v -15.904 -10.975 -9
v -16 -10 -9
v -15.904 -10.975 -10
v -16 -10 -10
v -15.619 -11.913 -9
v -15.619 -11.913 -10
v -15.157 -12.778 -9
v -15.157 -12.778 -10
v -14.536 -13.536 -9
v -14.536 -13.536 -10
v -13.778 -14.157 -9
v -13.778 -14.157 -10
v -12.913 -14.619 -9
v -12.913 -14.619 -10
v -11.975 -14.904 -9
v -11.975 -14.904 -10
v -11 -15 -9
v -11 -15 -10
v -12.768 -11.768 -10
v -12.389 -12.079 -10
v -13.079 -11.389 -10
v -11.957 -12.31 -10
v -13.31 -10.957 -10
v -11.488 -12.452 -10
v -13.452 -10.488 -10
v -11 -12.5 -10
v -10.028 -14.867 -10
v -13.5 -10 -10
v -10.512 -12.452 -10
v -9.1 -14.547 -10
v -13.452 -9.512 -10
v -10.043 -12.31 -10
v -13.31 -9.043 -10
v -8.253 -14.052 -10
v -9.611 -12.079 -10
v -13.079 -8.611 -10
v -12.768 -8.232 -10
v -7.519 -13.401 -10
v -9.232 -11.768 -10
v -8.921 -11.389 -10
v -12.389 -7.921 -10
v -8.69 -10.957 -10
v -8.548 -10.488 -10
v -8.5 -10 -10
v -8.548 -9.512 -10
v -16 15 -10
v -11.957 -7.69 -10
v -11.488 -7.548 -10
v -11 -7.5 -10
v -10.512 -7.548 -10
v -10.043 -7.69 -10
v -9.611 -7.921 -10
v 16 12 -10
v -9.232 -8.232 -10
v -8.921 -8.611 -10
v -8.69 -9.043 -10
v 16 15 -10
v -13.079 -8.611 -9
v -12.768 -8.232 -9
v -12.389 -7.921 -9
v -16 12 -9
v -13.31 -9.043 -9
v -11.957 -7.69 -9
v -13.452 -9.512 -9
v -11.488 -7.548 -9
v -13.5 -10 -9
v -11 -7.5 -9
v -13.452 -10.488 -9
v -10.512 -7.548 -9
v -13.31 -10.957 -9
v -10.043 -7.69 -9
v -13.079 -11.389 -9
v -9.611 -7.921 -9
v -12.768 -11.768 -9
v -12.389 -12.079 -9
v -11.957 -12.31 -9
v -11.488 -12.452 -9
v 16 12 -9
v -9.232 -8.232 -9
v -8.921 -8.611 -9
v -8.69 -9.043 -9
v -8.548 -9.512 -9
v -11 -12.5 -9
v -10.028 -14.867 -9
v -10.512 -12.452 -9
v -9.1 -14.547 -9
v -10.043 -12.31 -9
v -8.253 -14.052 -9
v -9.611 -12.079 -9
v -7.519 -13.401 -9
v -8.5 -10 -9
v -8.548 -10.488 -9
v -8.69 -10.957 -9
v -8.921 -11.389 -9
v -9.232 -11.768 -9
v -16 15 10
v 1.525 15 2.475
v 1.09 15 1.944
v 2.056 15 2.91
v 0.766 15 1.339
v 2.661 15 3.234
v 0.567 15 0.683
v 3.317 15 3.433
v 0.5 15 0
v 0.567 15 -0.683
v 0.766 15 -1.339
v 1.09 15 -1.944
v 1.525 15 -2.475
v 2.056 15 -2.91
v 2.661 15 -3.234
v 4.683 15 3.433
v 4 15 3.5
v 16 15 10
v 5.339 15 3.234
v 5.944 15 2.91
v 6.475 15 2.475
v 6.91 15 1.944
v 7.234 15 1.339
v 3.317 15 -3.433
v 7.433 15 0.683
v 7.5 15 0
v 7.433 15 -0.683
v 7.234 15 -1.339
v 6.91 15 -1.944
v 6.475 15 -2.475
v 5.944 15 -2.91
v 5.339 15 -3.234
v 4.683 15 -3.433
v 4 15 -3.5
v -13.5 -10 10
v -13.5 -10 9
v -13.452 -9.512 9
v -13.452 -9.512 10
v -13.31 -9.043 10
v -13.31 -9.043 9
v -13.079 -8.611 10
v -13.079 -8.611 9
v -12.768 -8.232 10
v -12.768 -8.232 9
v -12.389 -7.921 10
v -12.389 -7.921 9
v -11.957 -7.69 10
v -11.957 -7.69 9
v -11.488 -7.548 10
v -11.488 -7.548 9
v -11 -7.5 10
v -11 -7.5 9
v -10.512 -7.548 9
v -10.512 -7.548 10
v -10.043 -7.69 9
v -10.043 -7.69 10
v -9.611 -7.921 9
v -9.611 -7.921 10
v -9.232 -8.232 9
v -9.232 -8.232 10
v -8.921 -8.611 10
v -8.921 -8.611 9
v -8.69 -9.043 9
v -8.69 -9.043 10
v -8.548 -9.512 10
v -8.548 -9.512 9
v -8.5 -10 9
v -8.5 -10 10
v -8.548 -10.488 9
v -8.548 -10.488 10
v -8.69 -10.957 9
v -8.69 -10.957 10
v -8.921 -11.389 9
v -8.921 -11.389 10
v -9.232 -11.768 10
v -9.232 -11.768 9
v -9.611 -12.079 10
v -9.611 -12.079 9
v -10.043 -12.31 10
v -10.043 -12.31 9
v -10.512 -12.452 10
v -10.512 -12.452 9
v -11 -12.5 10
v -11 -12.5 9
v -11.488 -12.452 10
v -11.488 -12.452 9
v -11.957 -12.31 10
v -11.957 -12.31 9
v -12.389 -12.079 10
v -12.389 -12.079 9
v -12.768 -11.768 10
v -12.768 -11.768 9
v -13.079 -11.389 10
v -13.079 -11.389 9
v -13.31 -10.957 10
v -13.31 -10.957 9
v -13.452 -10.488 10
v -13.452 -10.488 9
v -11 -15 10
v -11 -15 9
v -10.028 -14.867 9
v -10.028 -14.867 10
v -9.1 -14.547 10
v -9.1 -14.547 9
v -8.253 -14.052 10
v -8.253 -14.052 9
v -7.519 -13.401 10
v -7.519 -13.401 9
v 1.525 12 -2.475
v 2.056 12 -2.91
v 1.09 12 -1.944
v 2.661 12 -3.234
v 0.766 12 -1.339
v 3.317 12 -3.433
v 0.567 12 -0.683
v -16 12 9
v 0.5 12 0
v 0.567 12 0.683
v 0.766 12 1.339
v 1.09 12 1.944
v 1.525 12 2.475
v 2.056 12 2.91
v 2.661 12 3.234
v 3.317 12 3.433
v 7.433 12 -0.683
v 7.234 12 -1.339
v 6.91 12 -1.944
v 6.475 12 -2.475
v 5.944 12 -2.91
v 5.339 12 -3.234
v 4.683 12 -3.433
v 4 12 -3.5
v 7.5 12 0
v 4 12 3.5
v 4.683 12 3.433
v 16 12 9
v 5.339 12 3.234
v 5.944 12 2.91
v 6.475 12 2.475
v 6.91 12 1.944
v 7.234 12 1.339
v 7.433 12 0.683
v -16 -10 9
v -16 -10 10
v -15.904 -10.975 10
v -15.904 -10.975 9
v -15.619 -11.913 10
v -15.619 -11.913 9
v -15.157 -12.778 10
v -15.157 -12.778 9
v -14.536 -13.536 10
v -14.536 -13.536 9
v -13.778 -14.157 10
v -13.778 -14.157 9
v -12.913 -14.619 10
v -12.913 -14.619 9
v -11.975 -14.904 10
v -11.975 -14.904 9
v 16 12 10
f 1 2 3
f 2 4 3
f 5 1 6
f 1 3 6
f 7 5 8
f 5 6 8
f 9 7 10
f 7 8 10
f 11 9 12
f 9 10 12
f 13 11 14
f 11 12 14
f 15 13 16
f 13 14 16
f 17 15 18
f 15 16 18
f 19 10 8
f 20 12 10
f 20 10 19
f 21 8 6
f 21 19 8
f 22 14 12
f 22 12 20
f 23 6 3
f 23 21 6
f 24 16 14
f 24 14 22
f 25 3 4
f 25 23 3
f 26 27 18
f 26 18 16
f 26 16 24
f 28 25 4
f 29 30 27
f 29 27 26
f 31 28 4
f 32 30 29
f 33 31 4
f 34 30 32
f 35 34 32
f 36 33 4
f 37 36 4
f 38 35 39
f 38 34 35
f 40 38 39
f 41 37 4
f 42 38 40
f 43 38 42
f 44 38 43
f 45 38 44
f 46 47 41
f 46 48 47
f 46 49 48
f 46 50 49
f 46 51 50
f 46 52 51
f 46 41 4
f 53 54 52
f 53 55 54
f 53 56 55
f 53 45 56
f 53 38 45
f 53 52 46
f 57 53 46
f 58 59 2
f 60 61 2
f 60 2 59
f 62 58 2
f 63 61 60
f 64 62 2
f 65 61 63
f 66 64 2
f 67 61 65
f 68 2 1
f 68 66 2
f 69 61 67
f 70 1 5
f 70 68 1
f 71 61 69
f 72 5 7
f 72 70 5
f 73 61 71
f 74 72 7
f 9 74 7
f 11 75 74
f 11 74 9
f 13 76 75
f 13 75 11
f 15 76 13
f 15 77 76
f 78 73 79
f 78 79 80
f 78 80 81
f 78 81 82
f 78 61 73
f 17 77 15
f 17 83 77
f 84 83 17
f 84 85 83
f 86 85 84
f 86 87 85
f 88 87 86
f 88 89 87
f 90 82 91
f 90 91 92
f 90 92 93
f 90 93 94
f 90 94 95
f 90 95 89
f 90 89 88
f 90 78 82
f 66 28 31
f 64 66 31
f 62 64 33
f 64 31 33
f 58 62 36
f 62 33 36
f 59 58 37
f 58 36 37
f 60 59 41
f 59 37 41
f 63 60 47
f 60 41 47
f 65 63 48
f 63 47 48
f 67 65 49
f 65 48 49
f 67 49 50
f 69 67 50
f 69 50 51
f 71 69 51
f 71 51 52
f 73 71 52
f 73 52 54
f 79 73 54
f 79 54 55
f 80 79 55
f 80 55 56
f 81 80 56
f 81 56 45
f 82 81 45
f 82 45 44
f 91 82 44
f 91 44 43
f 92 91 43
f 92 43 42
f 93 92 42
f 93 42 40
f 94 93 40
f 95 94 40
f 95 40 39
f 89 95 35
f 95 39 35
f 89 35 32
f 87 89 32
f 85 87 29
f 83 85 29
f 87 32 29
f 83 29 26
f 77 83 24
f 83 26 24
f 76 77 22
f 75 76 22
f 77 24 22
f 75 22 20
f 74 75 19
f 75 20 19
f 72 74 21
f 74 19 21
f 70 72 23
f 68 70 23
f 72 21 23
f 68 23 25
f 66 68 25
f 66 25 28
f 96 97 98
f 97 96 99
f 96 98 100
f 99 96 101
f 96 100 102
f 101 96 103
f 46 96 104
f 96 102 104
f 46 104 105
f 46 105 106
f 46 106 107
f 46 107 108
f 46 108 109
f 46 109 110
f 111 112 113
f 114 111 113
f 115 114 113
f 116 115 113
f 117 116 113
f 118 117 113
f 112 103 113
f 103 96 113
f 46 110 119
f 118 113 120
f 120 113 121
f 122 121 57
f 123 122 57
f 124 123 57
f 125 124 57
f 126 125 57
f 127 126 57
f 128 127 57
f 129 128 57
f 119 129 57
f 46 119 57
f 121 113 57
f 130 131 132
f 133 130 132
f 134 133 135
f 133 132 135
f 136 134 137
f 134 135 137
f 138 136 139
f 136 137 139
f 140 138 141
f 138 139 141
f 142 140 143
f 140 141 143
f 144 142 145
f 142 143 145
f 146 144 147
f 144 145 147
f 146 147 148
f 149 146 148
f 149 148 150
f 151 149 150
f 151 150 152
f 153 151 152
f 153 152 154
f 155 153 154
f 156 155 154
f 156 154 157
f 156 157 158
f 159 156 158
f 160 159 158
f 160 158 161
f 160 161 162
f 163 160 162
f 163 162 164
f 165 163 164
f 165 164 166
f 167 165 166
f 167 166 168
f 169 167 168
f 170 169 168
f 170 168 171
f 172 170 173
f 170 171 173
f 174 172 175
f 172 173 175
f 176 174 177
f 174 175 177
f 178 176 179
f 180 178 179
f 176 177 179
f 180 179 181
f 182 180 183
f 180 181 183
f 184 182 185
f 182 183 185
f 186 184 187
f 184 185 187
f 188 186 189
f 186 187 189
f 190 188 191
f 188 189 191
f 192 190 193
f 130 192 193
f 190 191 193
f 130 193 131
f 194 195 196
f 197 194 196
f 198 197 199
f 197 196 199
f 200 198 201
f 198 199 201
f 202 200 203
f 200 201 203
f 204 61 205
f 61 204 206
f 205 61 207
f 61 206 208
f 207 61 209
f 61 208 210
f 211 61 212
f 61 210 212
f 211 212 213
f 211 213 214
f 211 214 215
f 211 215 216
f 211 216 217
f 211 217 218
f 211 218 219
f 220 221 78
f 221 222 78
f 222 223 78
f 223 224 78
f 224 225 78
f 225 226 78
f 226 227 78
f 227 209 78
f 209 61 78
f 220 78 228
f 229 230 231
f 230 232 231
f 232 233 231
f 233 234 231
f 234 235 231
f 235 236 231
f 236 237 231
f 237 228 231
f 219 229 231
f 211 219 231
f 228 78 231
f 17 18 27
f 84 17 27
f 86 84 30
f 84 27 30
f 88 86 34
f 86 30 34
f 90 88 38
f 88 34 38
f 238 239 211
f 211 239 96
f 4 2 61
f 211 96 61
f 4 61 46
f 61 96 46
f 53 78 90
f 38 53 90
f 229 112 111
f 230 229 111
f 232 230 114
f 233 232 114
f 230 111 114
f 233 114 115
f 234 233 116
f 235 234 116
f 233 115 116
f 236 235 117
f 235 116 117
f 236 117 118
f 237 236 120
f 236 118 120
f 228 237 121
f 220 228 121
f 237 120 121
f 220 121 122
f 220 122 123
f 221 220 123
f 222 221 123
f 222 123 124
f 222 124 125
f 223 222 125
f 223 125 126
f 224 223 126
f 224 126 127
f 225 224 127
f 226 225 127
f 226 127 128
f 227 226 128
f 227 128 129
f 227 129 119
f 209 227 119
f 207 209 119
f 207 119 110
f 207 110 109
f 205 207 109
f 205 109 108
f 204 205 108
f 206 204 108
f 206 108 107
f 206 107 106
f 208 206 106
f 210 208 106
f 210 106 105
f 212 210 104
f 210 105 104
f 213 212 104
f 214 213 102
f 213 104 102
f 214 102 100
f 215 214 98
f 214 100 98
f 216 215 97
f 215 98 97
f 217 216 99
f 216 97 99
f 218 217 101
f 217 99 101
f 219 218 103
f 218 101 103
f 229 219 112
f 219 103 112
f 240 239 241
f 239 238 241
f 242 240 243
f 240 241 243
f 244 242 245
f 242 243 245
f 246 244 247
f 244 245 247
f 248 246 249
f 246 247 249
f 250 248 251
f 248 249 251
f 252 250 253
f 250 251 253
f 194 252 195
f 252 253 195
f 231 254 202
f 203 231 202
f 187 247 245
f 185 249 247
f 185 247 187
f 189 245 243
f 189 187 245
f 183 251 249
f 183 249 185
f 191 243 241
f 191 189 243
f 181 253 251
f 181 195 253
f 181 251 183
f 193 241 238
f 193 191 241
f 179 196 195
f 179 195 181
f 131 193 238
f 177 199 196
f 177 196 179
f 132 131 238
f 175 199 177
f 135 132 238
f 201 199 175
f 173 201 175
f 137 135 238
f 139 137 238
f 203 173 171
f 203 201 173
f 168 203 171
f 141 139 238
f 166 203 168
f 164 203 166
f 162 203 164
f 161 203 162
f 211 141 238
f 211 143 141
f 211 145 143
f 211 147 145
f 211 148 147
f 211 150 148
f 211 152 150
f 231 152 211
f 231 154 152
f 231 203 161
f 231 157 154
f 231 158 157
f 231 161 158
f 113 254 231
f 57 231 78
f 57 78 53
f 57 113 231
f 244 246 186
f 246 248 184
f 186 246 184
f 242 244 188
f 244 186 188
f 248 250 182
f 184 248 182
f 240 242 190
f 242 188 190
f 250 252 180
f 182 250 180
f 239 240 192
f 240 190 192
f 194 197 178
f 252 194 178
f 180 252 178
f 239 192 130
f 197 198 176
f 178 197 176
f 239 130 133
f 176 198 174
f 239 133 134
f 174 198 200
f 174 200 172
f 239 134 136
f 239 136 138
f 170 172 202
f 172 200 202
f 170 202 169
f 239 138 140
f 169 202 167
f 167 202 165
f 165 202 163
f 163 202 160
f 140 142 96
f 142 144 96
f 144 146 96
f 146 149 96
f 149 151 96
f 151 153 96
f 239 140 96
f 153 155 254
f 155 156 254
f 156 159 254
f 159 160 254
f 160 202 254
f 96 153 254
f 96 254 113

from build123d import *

# Parameters (mm, degrees)
SKETCH4_W               = 20
SKETCH4_H               = 30
BOSS_EXTRUDE2_DEPTH     = 16
CUT_EXTRUDE2_DEPTH      = 37.728735344
CUT_EXTRUDE2_DEPTH_BACK = 32
CUT_EXTRUDE4_DEPTH      = 30.681644159
CUT_EXTRUDE4_DEPTH_BACK = 30.681644159
SKETCH7_R               = 2.5
CUT_EXTRUDE5_DEPTH      = 30.681644159
FILLET2_R               = 5
FILLET3_R               = 5
FILLET4_R               = 5
FILLET5_R               = 5
CUT_EXTRUDE6_REACH      = 37.44
SKETCH8_R               = 3.5


with BuildPart() as part:
    # Sketch4 → Boss-Extrude2 (new, symmetric)
    with BuildSketch(Plane(origin=(0, 0, 0), x_dir=(0, 0, -1), z_dir=(1, 0, 0))):
        Rectangle(SKETCH4_W, SKETCH4_H)
    extrude(amount=BOSS_EXTRUDE2_DEPTH, both=True)

    # Sketch5 → Cut-Extrude2 (cut, two sides: drawn at the far end of the back side and taken through both)
    with BuildSketch(Plane.ZY.offset(16).offset(-CUT_EXTRUDE2_DEPTH_BACK)):
        Polygon((-9, -96.021123618), (-9, -15), (-9, 0), (-9, 12), (9, 12), (9, 0), (9, -15), (9, -96.021123618), (9, -258.063370855), (-9, -258.063370855), align=None)
    extrude(amount=CUT_EXTRUDE2_DEPTH + CUT_EXTRUDE2_DEPTH_BACK, mode=Mode.SUBTRACT)

    # Sketch6 → Cut-Extrude4 (cut, two sides: drawn at the far end of the back side and taken through both)
    with BuildSketch(Plane(origin=(0, 0, -10), x_dir=(-1, 0, 0), z_dir=(0, 0, -1)).offset(-CUT_EXTRUDE4_DEPTH_BACK)):
        Polygon((-79.686136493, 80.781027412), (-16, 12), (9, -15), (72.686136493, -83.781027412), (-64.875918332, -211.153300398), (-217.248191317, -46.591245573), align=None)
    extrude(amount=CUT_EXTRUDE4_DEPTH + CUT_EXTRUDE4_DEPTH_BACK, mode=Mode.SUBTRACT)

    # Sketch7 → Cut-Extrude5 (cut, through all)
    with BuildSketch(Plane(origin=(0, 0, -10), x_dir=(-1, 0, 0), z_dir=(0, 0, -1))):
        with Locations((11, -10)):
            Circle(SKETCH7_R)
    extrude(amount=-CUT_EXTRUDE5_DEPTH, mode=Mode.SUBTRACT)

    # Fillet2
    fillet2_edges = [part.edges().sort_by_distance(p)[0] for p in [
        (-16, -15, -9.5),
    ]]
    fillet(fillet2_edges, radius=FILLET2_R)

    # Fillet3
    # the kernel refuses this fillet: 5 mm, written as the material it takes off along each edge
    with BuildSketch(Plane(origin=(-9, -15, -15.449426147), x_dir=(-1, 0, 0), z_dir=(0, 0, 1))) as fillet3_piece_1:
        with BuildLine():
            CenterArc((2.187849813, -4.996469999), FILLET3_R, 92.15310702, 45.049491141)
            Line((-1.480953557, -1.599429841), (-1.554329624, -1.531489038))
            Line((-1.554329624, -1.531489038), (-0.073376067, 0.067940803))
            Line((-0.073376067, 0.067940803), (0, 0.1))
            ThreePointArc((0, 0.1), (1, 0.1), (1.996243004, 0.0999294))
            Line((1.996243004, 0.0999294), (2, 0))
        make_face()
    extrude(amount=11.898852295, mode=Mode.SUBTRACT)

    # Fillet4
    fillet4_edges = [part.edges().sort_by_distance(p)[0] for p in [
        (-16, -15, 9.5),
    ]]
    fillet(fillet4_edges, radius=FILLET4_R)

    # Fillet5
    # the kernel refuses this fillet: 5 mm, written as the material it takes off along each edge
    with BuildSketch(Plane(origin=(-9, -15, 3.550573853), x_dir=(-1, 0, 0), z_dir=(0, 0, 1))) as fillet5_piece_1:
        with BuildLine():
            CenterArc((2.187849813, -4.996469999), FILLET5_R, 92.15310702, 45.049491141)
            Line((-1.480953557, -1.599429841), (-1.554329624, -1.531489038))
            Line((-1.554329624, -1.531489038), (-0.073376067, 0.067940803))
            Line((-0.073376067, 0.067940803), (0, 0.1))
            ThreePointArc((0, 0.1), (1, 0.1), (1.996243004, 0.0999294))
            Line((1.996243004, 0.0999294), (2, 0))
        make_face()
    extrude(amount=11.898852295, mode=Mode.SUBTRACT)

    # Sketch8 → Cut-Extrude6 (cut, up to next)
    with BuildSketch(Plane(origin=(0, 15, 0), x_dir=(1, 0, 0), z_dir=(0, 1, 0)), mode=Mode.PRIVATE) as cut_extrude6_sk1:
        with Locations(Location((4, 0, 0), (0, 0, 270))):
            Circle(SKETCH8_R)
    cut_extrude6_tool1 = extrude(cut_extrude6_sk1.sketch, amount=-CUT_EXTRUDE6_REACH, mode=Mode.PRIVATE) & part.part
    add(cut_extrude6_tool1.solids().sort_by_distance((4, 15, 0))[0], mode=Mode.SUBTRACT)


solid = part.part
